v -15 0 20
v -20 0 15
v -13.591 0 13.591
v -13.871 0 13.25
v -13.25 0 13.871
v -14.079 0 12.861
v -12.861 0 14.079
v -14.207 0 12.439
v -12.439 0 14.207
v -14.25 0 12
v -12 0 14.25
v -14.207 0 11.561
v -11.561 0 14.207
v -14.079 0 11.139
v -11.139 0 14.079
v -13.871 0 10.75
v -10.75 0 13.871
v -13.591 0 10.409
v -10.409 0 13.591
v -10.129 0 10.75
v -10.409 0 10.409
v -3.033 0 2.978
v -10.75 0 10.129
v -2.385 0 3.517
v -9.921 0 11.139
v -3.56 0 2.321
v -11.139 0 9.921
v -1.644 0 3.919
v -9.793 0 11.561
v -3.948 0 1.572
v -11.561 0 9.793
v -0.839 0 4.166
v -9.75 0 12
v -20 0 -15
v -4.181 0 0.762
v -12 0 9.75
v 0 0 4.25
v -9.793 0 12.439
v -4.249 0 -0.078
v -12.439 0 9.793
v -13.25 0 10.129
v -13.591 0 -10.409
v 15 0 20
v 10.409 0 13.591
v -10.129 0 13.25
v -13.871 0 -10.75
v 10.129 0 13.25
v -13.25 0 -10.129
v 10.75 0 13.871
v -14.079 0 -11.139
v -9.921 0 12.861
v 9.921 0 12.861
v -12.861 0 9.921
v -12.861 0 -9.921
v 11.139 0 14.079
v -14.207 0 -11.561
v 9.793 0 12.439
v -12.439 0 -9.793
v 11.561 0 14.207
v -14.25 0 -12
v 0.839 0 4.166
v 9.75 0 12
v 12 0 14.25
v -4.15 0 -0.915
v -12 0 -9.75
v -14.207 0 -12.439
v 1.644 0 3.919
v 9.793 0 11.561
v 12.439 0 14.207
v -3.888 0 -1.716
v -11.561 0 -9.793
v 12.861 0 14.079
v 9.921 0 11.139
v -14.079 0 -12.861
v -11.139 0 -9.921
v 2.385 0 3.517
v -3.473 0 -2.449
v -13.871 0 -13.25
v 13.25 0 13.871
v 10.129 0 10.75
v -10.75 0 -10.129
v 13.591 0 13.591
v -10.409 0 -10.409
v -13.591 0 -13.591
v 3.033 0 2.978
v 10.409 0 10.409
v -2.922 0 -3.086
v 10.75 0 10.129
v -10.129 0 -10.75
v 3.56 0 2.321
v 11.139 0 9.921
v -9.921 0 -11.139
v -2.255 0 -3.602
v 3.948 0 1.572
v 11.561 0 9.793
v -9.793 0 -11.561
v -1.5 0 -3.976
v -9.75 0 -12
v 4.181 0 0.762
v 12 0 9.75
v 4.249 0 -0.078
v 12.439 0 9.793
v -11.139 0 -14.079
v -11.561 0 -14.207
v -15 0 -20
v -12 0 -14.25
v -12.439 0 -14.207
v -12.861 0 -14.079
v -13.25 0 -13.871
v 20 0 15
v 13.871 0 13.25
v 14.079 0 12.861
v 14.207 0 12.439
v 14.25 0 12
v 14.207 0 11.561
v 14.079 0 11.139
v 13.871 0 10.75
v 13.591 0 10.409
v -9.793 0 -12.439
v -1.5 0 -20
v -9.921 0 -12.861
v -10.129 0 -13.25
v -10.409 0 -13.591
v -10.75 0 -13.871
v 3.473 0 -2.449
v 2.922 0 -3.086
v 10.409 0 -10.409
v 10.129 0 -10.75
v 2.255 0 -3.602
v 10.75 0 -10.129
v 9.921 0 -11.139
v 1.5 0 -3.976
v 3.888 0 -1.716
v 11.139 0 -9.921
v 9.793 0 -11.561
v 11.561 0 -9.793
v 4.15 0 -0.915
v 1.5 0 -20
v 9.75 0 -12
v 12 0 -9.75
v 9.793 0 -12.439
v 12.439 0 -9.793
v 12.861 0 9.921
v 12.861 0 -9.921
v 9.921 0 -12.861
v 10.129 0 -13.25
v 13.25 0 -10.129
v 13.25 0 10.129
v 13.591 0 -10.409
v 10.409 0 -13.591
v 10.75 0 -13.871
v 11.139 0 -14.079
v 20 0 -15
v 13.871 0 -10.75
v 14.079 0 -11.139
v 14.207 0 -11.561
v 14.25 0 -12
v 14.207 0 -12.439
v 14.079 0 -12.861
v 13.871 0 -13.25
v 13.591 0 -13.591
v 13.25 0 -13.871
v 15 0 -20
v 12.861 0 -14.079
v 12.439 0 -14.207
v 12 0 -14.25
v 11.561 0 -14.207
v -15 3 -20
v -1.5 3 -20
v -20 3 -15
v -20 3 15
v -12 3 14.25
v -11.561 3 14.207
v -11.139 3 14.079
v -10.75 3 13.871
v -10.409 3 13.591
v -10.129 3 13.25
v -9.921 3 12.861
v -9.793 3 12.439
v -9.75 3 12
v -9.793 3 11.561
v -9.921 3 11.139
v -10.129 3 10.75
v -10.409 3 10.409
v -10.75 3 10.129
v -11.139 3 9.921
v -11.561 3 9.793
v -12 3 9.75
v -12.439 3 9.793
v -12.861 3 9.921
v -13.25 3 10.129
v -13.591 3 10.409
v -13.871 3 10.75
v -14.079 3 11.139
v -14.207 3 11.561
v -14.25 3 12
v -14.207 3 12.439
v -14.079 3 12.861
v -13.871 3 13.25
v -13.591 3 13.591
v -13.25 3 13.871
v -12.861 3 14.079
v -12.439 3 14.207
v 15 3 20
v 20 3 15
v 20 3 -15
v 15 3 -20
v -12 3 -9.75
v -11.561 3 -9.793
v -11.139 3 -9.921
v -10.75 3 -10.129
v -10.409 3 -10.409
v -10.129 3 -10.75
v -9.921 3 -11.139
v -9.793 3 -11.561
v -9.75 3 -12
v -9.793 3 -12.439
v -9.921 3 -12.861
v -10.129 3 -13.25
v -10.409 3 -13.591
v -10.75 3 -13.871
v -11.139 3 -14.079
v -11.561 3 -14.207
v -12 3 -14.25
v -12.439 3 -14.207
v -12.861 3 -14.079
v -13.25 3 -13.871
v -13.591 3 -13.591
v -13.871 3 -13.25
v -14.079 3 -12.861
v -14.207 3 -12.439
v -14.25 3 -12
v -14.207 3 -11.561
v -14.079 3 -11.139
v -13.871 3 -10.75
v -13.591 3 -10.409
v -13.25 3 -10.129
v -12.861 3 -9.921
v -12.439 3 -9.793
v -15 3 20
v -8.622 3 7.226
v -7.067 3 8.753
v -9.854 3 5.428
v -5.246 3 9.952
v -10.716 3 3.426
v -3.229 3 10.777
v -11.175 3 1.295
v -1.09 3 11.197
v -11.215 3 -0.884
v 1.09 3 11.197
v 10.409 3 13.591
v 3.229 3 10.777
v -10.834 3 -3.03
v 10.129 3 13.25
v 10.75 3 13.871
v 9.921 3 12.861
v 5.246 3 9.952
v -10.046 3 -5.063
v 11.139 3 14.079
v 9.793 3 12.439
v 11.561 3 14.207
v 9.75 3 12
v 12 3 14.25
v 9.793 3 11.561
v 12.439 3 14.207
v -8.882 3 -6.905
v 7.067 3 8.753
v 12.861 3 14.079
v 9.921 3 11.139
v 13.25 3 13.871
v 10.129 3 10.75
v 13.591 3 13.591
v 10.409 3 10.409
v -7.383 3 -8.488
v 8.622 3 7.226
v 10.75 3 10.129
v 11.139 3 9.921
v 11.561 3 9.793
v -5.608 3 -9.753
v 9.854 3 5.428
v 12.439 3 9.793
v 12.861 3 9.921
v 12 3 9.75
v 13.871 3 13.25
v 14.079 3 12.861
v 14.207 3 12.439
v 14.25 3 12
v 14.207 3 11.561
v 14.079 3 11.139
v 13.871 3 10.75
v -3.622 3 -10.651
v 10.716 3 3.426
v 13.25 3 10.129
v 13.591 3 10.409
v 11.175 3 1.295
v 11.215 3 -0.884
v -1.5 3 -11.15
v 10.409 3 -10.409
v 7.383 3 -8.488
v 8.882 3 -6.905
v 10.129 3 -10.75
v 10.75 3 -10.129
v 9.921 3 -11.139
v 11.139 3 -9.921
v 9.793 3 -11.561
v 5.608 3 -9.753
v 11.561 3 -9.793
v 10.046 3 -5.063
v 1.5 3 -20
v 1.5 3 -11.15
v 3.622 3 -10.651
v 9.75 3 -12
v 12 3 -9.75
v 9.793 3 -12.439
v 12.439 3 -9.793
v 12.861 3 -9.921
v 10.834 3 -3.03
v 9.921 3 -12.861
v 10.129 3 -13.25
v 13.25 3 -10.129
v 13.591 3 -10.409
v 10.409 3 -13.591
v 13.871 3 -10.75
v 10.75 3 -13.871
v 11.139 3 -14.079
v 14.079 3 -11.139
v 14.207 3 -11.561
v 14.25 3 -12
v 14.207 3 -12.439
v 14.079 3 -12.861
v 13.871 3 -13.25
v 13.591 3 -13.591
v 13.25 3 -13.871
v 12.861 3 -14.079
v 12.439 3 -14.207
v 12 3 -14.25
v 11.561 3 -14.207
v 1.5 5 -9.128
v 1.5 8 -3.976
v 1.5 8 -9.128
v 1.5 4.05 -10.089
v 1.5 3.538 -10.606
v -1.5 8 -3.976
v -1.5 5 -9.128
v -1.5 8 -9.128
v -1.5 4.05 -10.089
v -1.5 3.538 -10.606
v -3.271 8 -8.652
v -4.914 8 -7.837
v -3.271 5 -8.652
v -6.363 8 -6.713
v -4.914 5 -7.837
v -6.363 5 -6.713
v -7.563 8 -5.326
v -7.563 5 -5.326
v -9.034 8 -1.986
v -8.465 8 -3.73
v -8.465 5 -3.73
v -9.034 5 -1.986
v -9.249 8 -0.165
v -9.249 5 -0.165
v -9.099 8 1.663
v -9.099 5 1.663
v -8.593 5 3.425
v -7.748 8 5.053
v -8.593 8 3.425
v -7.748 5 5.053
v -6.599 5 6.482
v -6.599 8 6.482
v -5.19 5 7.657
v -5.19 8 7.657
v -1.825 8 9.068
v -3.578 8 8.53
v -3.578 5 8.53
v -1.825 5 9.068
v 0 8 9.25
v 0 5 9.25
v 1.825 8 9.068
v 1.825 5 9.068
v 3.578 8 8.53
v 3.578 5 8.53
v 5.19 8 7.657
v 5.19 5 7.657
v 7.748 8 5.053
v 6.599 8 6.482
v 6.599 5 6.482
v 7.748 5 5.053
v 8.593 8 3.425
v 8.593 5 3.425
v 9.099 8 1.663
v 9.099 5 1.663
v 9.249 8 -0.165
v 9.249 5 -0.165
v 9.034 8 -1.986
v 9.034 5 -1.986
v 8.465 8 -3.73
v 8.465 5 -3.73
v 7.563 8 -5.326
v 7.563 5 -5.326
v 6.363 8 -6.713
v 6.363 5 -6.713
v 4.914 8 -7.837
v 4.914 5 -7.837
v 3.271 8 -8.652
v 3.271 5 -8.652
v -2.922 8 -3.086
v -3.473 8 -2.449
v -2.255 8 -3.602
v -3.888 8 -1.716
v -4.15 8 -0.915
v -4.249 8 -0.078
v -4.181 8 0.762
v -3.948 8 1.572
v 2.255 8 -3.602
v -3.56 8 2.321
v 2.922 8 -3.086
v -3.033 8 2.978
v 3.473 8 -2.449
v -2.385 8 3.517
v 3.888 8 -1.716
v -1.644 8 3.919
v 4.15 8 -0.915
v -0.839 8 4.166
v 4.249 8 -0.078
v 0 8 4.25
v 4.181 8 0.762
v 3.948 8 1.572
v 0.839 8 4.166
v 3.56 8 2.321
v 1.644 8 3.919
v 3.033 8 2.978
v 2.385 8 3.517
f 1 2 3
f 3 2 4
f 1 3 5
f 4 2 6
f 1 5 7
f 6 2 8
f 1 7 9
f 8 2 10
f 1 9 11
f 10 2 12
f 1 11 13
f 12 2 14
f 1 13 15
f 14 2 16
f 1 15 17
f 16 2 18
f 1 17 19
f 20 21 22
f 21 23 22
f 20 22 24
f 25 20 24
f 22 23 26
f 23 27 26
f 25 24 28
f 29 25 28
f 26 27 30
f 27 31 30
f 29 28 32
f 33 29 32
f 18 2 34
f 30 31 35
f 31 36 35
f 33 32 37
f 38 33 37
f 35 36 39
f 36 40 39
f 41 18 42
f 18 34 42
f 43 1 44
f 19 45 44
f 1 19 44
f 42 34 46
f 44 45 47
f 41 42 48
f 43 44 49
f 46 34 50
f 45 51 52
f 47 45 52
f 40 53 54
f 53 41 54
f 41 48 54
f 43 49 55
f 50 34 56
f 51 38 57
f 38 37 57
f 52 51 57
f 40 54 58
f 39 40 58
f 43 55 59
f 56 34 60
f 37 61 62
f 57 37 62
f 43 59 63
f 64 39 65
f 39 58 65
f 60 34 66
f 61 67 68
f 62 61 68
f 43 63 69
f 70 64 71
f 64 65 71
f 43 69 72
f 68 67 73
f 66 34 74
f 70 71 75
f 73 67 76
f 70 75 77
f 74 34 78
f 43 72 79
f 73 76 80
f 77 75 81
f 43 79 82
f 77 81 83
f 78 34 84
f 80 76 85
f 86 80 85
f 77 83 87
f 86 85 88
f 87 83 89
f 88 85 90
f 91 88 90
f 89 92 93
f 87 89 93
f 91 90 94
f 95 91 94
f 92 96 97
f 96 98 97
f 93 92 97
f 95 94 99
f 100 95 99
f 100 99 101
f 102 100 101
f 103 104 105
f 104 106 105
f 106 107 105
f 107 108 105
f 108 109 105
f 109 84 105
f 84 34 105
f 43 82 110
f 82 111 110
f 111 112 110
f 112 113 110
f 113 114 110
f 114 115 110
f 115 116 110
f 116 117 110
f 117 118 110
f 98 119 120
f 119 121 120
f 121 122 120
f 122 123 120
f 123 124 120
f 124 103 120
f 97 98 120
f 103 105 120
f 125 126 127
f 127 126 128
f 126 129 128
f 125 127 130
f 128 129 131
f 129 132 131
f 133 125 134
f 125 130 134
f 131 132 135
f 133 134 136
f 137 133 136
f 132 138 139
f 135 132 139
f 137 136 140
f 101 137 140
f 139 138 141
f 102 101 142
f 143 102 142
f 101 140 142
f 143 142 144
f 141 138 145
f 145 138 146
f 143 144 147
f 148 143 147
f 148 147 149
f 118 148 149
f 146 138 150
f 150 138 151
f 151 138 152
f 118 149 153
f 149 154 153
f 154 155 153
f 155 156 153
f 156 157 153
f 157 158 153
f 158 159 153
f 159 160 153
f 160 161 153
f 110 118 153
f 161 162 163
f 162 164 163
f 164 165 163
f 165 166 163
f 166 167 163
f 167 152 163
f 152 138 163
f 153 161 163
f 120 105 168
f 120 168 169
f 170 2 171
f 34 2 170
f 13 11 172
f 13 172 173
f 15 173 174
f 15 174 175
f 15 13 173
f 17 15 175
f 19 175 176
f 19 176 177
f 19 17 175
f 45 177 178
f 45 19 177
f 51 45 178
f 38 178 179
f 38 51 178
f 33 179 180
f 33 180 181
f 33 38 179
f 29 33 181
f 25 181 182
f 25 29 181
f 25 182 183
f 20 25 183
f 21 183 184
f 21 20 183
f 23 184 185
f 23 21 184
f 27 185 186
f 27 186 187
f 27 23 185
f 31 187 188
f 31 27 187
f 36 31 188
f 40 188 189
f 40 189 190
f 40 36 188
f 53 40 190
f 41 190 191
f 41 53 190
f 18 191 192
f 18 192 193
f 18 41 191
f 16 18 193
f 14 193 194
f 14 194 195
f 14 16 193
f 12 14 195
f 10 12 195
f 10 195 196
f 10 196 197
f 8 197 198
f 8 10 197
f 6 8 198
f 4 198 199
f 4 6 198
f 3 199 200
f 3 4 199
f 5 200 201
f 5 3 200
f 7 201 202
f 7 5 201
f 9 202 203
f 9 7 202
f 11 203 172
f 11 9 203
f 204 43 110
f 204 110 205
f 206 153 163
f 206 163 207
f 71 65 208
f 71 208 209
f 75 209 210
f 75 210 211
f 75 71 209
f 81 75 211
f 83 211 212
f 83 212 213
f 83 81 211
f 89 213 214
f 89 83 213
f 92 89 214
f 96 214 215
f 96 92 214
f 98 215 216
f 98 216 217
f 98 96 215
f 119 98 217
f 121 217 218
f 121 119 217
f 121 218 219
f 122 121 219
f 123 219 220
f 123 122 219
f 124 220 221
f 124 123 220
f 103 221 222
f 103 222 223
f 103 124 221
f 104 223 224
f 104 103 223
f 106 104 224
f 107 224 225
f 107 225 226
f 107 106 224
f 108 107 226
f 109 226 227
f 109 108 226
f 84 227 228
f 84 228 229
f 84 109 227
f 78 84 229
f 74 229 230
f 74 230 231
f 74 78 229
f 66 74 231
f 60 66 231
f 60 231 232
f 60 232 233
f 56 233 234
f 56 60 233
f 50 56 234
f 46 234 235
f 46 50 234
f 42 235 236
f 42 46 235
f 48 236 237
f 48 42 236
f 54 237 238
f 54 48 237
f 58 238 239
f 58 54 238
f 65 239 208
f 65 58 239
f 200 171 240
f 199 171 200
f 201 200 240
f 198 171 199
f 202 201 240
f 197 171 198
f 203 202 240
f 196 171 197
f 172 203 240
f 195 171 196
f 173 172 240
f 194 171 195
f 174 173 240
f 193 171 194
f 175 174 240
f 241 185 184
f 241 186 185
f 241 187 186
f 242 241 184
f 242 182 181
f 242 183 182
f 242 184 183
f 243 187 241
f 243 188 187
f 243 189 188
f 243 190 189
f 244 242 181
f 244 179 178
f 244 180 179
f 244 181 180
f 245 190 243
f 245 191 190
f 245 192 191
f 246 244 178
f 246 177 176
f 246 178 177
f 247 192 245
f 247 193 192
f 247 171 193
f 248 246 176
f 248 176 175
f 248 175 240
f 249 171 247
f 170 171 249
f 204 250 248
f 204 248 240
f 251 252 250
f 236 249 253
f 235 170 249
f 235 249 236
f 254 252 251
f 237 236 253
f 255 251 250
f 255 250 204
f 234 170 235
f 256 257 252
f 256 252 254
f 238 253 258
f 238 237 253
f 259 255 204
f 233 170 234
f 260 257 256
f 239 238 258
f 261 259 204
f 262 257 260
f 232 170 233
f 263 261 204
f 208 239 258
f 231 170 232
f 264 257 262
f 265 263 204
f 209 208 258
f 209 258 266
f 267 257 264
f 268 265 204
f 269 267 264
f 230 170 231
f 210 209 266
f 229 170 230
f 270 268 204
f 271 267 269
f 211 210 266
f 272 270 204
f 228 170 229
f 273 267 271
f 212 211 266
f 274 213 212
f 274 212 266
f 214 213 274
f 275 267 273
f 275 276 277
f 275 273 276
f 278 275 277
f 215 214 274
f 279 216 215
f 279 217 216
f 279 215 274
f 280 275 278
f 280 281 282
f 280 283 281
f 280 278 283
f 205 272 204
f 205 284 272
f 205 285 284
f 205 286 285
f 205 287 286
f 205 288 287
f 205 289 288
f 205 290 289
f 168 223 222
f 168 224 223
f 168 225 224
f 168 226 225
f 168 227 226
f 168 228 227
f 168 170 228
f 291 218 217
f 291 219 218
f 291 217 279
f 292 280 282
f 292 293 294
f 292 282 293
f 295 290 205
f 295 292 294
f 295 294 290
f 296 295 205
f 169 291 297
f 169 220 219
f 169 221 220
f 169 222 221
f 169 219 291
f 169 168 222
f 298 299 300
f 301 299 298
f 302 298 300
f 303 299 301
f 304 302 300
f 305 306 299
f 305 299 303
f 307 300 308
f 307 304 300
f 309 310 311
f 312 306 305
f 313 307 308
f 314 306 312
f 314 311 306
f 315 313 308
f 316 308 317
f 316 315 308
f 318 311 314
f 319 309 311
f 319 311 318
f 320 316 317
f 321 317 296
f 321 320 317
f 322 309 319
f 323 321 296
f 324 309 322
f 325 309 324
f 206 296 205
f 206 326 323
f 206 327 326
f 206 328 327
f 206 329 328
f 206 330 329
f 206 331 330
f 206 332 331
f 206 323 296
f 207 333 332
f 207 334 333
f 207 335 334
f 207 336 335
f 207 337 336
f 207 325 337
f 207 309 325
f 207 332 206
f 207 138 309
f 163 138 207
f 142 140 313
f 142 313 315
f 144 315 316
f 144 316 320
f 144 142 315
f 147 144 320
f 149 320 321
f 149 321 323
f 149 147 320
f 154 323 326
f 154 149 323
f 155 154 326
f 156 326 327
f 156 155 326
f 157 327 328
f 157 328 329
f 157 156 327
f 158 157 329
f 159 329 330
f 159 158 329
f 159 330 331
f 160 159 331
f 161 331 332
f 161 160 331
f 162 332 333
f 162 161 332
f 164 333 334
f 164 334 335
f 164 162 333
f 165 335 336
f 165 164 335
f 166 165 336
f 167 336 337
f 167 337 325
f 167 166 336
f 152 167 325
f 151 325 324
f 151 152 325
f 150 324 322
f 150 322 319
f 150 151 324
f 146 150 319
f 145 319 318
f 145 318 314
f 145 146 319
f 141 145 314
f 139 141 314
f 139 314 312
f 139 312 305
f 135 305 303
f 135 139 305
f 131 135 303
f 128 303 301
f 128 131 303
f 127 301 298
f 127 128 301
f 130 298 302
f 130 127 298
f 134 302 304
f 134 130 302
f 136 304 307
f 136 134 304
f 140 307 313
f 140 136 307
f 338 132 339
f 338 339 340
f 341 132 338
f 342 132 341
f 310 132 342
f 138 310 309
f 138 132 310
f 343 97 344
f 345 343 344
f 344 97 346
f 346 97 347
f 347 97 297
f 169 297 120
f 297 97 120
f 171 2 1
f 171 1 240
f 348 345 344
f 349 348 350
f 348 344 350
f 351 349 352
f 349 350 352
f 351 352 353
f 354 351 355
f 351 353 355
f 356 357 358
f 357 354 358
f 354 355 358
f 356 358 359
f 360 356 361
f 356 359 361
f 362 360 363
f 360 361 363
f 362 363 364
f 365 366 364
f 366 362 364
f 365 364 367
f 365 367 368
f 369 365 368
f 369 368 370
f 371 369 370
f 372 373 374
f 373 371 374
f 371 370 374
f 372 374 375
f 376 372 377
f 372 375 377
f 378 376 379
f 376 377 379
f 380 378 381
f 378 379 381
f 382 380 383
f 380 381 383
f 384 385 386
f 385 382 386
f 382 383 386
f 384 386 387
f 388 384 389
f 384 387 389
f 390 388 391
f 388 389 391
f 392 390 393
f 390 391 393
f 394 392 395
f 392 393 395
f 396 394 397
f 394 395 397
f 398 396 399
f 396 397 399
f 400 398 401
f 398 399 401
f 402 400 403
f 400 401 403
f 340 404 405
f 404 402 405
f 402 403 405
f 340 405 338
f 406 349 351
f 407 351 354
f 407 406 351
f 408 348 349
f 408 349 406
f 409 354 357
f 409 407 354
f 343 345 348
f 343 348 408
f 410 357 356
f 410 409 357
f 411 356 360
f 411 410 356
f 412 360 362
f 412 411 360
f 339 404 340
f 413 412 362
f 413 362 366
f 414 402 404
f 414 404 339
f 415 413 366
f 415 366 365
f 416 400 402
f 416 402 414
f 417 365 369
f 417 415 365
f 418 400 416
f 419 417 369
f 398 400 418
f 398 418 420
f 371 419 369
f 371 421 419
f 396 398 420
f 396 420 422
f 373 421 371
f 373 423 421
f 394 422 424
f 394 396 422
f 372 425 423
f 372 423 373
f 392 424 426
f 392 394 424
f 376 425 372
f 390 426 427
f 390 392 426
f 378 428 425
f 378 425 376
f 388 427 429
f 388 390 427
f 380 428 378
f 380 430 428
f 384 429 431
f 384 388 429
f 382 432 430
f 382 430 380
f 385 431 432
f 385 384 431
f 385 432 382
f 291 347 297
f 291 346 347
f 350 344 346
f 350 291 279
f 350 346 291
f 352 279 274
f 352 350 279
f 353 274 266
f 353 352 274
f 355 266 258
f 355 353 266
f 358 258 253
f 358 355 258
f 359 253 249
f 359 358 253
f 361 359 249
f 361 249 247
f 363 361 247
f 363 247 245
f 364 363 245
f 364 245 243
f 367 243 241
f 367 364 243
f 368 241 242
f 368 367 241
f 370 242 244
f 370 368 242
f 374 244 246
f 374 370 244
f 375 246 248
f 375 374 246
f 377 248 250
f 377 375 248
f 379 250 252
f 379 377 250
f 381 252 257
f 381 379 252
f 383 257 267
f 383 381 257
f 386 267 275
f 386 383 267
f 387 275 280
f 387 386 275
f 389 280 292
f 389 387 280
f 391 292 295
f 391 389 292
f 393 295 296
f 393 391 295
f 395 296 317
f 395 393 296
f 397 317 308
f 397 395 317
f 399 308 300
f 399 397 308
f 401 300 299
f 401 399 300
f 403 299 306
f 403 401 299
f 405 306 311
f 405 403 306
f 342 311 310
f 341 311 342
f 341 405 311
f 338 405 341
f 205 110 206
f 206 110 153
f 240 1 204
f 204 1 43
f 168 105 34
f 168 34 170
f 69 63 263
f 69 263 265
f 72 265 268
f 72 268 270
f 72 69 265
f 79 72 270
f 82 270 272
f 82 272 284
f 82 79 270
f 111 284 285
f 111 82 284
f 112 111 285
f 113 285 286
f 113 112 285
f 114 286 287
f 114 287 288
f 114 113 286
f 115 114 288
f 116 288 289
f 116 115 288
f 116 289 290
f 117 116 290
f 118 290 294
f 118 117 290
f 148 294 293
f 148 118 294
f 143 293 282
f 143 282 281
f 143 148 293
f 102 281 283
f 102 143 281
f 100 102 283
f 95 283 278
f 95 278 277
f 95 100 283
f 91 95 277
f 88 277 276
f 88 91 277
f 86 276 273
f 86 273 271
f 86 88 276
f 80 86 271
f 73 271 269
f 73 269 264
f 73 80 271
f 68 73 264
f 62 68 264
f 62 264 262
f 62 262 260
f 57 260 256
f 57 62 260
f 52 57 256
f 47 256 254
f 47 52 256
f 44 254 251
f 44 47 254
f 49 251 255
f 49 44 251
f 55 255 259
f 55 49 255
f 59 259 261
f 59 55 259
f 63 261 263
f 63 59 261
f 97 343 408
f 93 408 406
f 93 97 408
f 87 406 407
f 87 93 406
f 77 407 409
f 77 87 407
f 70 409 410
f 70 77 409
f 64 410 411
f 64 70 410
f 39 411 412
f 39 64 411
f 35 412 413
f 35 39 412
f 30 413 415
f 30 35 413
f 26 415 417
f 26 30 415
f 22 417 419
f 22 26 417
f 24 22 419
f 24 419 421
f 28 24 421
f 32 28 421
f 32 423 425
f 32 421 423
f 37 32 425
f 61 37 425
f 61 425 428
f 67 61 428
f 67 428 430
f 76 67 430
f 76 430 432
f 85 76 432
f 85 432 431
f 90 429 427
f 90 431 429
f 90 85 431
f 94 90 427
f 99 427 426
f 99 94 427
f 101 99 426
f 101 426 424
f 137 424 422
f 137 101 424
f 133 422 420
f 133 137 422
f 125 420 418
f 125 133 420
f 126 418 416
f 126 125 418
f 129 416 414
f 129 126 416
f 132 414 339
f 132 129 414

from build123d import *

# Parameters (mm, degrees)
SKETCH1_W                    = 40
SKETCH1_H                    = 40
SKETCH1_R                    = 4.25
SKETCH1_R_2                  = 2.25
BOSS_EXTRUDE1_DEPTH          = 3
SKETCH3_R                    = 9.25
SKETCH3_R_2                  = 4.25
BOSS_EXTRUDE2_DEPTH          = 5
CUT_EXTRUDE_THIN1_DEPTH      = 29.722813233
CUT_EXTRUDE_THIN1_DEPTH_BACK = 3
SKETCH2_W                    = 3
SKETCH2_H                    = 20
CHAMFER1_SIZE                = 5
CHAMFER2_SIZE                = 2


with BuildPart() as part:
    # Sketch1 → Boss-Extrude1 (new body)
    with BuildSketch(Plane(origin=(0, 0, 0), x_dir=(1, 0, 0), z_dir=(0, 1, 0))):
        Rectangle(SKETCH1_W, SKETCH1_H)
        with Locations(Location((0, 0, 0), (0, 0, 270))):
            Circle(SKETCH1_R, mode=Mode.SUBTRACT)
        with Locations(Location((-12, -12, 0), (0, 0, 270))):
            Circle(SKETCH1_R_2, mode=Mode.SUBTRACT)
        with Locations(Location((-12, 12, 0), (0, 0, 270))):
            Circle(SKETCH1_R_2, mode=Mode.SUBTRACT)
        with Locations(Location((12, 12, 0), (0, 0, 270))):
            Circle(SKETCH1_R_2, mode=Mode.SUBTRACT)
        with Locations(Location((12, -12, 0), (0, 0, 270))):
            Circle(SKETCH1_R_2, mode=Mode.SUBTRACT)
    extrude(amount=BOSS_EXTRUDE1_DEPTH)

    # Sketch3 → Boss-Extrude2 (add)
    with BuildSketch(Plane(origin=(0, 3, 0), x_dir=(1, 0, 0), z_dir=(0, 1, 0))):
        with Locations(Location((0, 0, 0), (0, 0, 270))):
            Circle(SKETCH3_R)
        with Locations(Location((0, 0, 0), (0, 0, 270))):
            Circle(SKETCH3_R_2, mode=Mode.SUBTRACT)
    extrude(amount=BOSS_EXTRUDE2_DEPTH)

    # Sketch2 → Cut-Extrude-Thin1 (cut, two sides: drawn at the far end of the back side and taken through both)
    with BuildSketch(Plane(origin=(0, 3, 0), x_dir=(1, 0, 0), z_dir=(0, 1, 0)).offset(-CUT_EXTRUDE_THIN1_DEPTH_BACK)):
        with Locations((0, 10)):
            Rectangle(SKETCH2_W, SKETCH2_H)
    extrude(amount=CUT_EXTRUDE_THIN1_DEPTH + CUT_EXTRUDE_THIN1_DEPTH_BACK, mode=Mode.SUBTRACT)

    # Chamfer1
    chamfer1_edges = [part.edges().sort_by_distance(p)[0] for p in [
        (20, 1.5, 20),
        (-20, 1.5, 20),
        (-20, 1.5, -20),
        (20, 1.5, -20),
    ]]
    chamfer(chamfer1_edges, length=CHAMFER1_SIZE)

    # Chamfer2
    chamfer2_edges = [part.edges().sort_by_distance(p)[0] for p in [
        (0, 3, 9.25),
    ]]
    chamfer(chamfer2_edges, length=CHAMFER2_SIZE)


solid = part.part
